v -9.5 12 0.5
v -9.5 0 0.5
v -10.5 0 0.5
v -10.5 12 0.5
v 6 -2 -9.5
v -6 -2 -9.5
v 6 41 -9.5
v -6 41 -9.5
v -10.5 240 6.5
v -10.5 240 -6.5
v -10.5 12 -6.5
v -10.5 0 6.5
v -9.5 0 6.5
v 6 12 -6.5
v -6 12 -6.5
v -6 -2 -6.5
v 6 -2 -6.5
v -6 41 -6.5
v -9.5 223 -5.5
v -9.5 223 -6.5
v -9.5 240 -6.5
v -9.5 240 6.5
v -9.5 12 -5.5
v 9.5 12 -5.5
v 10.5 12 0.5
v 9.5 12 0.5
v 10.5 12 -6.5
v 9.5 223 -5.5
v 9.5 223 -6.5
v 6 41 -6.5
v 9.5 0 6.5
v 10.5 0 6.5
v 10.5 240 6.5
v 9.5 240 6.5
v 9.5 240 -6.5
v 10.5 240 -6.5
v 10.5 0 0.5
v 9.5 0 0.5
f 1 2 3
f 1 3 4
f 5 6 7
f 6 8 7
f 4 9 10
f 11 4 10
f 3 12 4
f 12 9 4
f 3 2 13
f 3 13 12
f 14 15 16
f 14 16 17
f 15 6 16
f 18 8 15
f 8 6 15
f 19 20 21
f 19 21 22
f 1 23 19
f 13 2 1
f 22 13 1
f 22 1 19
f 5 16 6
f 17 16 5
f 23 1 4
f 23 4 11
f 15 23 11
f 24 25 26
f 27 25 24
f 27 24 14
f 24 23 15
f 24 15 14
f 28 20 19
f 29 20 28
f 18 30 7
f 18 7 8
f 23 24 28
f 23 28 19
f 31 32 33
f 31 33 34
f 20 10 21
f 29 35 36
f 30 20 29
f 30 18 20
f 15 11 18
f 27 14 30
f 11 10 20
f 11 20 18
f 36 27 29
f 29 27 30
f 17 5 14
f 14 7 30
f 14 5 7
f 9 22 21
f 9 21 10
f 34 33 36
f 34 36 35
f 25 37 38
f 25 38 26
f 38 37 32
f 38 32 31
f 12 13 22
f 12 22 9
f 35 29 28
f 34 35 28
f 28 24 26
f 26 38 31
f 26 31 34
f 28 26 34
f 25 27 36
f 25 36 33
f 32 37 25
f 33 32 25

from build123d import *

# Parameters (mm, degrees)
BOSS_EXTRUDE1_DEPTH = 240
SKETCH3_W           = 19
SKETCH3_H           = 1
CUT_EXTRUDE1_DEPTH  = 17
SKETCH4_W           = 19
SKETCH4_H           = 1
CUT_EXTRUDE2_DEPTH  = 11
SKETCH5_W           = 12
SKETCH5_H           = 30
BOSS_EXTRUDE2_DEPTH = 3
SKETCH6_W           = 12
SKETCH6_H           = 3
BOSS_EXTRUDE3_DEPTH = 13
SKETCH7_W           = 7
SKETCH7_H           = 12
CUT_EXTRUDE3_DEPTH  = 30


with BuildPart() as part:
    # Sketch2 → Boss-Extrude1 (new body)
    with BuildSketch(Plane(origin=(0, 0, 0), x_dir=(1, 0, 0), z_dir=(0, 1, 0))):
        Polygon((-10.5, -6.5), (-10.5, 6.5), (10.5, 6.5), (10.5, -6.5), (9.5, -6.5), (9.5, 5.5), (-9.5, 5.5), (-9.5, -6.5), align=None)
    extrude(amount=BOSS_EXTRUDE1_DEPTH)

    # Sketch3 → Cut-Extrude1 (cut)
    with BuildSketch(Plane(origin=(0, 240, 0), x_dir=(1, 0, 0), z_dir=(0, 1, 0))):
        with Locations((0, 6)):
            Rectangle(SKETCH3_W, SKETCH3_H)
    extrude(amount=-CUT_EXTRUDE1_DEPTH, mode=Mode.SUBTRACT)

    # Sketch4 → Cut-Extrude2 (cut)
    with BuildSketch(Plane.XZ):
        with Locations((0, -6)):
            Rectangle(SKETCH4_W, SKETCH4_H)
    extrude(amount=-CUT_EXTRUDE2_DEPTH, mode=Mode.SUBTRACT)

    # Sketch5 → Boss-Extrude2 (add)
    with BuildSketch(Plane(origin=(0, 0, -6.5), x_dir=(-1, 0, 0), z_dir=(0, 0, -1))):
        with Locations((0, 26)):
            Rectangle(SKETCH5_W, SKETCH5_H)
    extrude(amount=BOSS_EXTRUDE2_DEPTH)

    # Sketch6 → Boss-Extrude3 (add)
    with BuildSketch(Plane.XZ.offset(-11)):
        with Locations((0, -8)):
            Rectangle(SKETCH6_W, SKETCH6_H)
    extrude(amount=BOSS_EXTRUDE3_DEPTH)

    # Sketch7 → Cut-Extrude3 (cut)
    with BuildSketch(Plane(origin=(10.5, 0, 0), x_dir=(0, 0, -1), z_dir=(1, 0, 0))):
        with Locations((3, 6)):
            Rectangle(SKETCH7_W, SKETCH7_H)
    extrude(amount=-CUT_EXTRUDE3_DEPTH, mode=Mode.SUBTRACT)


solid = part.part
